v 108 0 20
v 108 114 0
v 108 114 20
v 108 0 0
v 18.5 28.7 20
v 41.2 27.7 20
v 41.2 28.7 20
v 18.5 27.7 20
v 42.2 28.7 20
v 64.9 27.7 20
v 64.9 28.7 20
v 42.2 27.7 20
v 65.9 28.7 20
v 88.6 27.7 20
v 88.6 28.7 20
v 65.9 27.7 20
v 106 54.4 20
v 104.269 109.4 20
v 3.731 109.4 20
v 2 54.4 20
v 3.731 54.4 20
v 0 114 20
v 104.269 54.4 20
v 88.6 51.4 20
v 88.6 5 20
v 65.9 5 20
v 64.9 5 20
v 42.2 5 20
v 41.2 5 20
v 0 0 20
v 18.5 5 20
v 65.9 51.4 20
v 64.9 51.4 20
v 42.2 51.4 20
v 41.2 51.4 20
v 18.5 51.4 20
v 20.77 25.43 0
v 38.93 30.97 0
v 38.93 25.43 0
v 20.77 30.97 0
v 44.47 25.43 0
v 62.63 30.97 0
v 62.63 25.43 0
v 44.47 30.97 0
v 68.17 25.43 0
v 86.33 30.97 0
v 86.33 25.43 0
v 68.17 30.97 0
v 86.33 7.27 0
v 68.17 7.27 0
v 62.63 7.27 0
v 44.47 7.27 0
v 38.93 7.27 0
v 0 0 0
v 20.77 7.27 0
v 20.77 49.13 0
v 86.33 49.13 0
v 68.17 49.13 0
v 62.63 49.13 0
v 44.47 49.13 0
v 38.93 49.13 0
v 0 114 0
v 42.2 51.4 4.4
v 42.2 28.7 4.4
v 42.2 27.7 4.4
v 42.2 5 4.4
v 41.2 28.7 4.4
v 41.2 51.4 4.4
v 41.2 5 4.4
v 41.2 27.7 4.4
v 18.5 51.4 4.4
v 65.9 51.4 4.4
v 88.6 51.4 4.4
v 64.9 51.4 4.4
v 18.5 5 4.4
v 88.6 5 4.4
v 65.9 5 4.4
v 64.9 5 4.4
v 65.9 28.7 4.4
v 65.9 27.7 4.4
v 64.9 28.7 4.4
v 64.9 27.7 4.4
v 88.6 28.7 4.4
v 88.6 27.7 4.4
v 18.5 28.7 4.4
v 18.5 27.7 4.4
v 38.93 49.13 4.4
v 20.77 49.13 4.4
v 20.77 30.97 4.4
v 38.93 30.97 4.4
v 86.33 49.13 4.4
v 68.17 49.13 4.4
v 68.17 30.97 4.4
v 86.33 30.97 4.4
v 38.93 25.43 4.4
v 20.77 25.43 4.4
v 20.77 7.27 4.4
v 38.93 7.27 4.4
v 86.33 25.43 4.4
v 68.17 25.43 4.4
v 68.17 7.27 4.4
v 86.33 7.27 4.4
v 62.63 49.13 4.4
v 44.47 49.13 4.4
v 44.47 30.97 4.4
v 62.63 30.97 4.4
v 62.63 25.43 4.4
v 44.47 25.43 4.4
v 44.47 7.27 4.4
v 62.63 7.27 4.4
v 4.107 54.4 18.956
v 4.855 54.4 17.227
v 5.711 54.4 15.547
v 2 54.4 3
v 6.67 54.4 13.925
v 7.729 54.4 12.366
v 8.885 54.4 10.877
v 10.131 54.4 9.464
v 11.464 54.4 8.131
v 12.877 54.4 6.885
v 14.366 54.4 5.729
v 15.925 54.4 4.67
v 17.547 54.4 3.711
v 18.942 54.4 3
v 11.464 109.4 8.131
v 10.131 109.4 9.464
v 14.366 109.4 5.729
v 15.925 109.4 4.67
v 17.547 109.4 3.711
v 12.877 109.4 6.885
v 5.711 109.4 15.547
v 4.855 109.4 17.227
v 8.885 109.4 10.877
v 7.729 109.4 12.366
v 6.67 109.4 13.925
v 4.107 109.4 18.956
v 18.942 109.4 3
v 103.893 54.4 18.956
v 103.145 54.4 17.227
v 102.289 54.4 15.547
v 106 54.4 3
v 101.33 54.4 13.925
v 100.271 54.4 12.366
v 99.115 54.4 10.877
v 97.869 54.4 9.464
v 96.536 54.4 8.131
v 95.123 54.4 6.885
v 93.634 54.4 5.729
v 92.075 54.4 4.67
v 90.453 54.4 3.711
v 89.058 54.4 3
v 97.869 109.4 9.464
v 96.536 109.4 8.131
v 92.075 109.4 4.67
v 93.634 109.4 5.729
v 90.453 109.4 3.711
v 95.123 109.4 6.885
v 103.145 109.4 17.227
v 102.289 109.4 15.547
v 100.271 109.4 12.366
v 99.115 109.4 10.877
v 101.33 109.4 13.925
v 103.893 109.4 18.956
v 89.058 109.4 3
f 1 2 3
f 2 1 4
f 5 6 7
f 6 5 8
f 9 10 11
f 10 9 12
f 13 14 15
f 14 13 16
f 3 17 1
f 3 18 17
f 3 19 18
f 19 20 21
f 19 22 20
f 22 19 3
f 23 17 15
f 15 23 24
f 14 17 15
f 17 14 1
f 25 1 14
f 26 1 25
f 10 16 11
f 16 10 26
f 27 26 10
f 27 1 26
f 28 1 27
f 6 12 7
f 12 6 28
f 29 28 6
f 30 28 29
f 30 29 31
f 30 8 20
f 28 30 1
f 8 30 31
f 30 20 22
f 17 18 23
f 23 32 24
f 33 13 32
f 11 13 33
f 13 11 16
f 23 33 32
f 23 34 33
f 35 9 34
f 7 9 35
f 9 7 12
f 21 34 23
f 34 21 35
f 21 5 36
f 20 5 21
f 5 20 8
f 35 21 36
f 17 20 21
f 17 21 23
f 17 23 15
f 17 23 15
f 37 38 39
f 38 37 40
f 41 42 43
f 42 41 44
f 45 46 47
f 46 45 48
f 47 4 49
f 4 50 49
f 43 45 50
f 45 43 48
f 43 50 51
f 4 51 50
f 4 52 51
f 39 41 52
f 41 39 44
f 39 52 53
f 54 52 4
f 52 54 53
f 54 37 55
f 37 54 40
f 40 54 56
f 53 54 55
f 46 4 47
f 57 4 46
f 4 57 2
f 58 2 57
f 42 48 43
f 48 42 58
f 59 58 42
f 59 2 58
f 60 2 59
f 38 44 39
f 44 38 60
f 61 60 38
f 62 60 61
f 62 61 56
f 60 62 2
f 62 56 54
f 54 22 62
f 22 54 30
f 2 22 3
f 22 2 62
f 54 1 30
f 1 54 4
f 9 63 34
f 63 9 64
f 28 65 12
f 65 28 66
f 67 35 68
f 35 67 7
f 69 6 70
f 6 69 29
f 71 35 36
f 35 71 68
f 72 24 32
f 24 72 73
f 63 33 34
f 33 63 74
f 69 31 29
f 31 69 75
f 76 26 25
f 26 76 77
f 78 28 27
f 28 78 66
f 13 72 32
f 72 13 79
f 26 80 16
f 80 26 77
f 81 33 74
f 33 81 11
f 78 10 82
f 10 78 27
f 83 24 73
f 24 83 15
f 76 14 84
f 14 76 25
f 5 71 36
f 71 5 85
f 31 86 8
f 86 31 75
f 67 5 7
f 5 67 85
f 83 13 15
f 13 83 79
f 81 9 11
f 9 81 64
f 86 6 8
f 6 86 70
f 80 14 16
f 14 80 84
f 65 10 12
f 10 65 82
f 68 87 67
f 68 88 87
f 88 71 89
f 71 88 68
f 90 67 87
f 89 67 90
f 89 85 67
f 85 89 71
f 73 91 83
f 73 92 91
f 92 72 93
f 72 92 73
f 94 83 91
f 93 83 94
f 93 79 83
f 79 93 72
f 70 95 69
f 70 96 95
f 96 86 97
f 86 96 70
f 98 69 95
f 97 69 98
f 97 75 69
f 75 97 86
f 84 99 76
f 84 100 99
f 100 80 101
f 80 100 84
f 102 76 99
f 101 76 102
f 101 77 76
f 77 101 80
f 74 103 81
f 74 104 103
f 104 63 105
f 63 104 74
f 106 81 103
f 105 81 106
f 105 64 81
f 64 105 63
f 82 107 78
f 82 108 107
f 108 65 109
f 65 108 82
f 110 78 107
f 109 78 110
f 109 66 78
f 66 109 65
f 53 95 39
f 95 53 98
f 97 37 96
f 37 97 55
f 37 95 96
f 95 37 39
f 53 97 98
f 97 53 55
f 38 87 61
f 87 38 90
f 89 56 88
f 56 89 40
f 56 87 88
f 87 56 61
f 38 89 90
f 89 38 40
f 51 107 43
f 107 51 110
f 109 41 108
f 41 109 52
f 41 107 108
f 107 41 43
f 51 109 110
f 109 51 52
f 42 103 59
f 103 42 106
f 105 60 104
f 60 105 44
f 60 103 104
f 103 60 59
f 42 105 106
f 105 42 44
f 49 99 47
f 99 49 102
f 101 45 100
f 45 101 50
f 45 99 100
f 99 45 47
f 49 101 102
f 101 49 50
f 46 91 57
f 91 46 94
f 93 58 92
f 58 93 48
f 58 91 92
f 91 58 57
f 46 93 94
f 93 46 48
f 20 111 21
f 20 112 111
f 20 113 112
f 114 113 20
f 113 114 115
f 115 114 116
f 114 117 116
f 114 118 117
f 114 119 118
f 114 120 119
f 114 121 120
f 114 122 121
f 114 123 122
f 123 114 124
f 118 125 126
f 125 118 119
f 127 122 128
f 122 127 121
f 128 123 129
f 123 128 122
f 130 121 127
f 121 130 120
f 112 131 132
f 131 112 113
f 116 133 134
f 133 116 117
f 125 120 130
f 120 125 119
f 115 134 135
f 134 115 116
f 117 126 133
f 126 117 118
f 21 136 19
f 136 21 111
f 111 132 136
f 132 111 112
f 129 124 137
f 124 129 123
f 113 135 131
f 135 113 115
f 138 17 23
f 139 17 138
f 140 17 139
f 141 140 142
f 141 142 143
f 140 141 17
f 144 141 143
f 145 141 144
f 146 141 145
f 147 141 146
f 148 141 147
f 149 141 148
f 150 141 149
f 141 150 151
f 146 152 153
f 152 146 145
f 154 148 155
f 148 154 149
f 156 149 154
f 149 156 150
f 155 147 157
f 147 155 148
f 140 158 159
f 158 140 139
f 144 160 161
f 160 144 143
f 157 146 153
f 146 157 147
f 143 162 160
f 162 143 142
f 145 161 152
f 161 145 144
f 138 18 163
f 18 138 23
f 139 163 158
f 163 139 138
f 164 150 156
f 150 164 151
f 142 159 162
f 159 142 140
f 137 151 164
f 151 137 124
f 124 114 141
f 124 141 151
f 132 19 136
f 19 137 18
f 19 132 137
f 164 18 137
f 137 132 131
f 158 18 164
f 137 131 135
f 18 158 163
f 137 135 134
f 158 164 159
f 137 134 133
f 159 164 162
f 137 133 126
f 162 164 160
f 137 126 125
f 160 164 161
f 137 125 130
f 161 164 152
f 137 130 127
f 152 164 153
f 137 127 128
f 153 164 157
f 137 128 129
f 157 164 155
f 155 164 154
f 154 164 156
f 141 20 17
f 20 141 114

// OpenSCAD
include <../../The-Boardgame-Insert-Toolkit.v2.45/boardgame_insert_toolkit_lib.2.scad>;

coin_diametre = 25;

insert_height = 23;
insert_width = 108;
insert_depth = 114;

box_height = insert_height - 3;
box_width = (insert_width);
box_depth = insert_depth;

scout_tile_xy = 22.7;
scout_tile_thickness = 1.95;
scout_tile_compartment_depth = scout_tile_thickness * 8;

// determines whether lids are output.
g_b_print_lid = false;

// determines whether boxes are output.
g_b_print_box = true; 

// Focus on one box
g_isolated_print_box = ""; 

// Used to visualize how all of the boxes fit together. 
g_b_visualization = false;          
        
// this is the outer wall thickness.
//Default = 1.5mm
g_wall_thickness = 3;

// The tolerance value is extra space put between planes of the lid and box that fit together.
// Increase the tolerance to loosen the fit and decrease it to tighten it.
//
// Note that the tolerance is applied exclusively to the lid.
// So if the lid is too tight or too loose, change this value ( up for looser fit, down for tighter fit ) and 
// you only need to reprint the lid.
// 
// The exception is the stackable box, where the bottom of the box is the lid of the box below,
// in which case the tolerance also affects that box bottom.
//
g_tolerance = 0.15;

// This adjusts the position of the lid detents downward. 
// The larger the value, the bigger the gap between the lid and the box.
g_tolerance_detents_pos = 0.1;


data =
[
	[   "simple box",
		[
			[ BOX_SIZE_XYZ, [box_width, box_depth, box_height] ],
			[ BOX_STACKABLE_B, f ],
			[ BOX_NO_LID_B, true ],
			
			[ BOX_COMPONENT,
				[ // Trucks
					[ CMP_COMPARTMENT_SIZE_XYZ,  [ scout_tile_xy, scout_tile_xy, scout_tile_compartment_depth ] ],
					[ POSITION_XY, [15.5,2]],
					//[ CMP_CUTOUT_SIDES_4B, [ t, t, t, t ] ],
					[ CMP_NUM_COMPARTMENTS_XY, [3, 2]],
					[ CMP_CUTOUT_WIDTH_PCT, 85 ],
					[ CMP_CUTOUT_DEPTH_PCT, 5 ],
					[ CMP_CUTOUT_TYPE, INTERIOR ],
					[ CMP_CUTOUT_BOTTOM_B, true ],
				]
			],
			[ BOX_COMPONENT,
				[ // Dice + starting player marker
					[ CMP_COMPARTMENT_SIZE_XYZ,  [ box_width-4,55,20 ] ],
					[ POSITION_XY, [-1,scout_tile_xy*2+g_wall_thickness*2]],
					[ CMP_SHAPE, FILLET ],
					[ CMP_FILLET_RADIUS, 30 ],
				]
			],
		]
	],
];


MakeAll();
